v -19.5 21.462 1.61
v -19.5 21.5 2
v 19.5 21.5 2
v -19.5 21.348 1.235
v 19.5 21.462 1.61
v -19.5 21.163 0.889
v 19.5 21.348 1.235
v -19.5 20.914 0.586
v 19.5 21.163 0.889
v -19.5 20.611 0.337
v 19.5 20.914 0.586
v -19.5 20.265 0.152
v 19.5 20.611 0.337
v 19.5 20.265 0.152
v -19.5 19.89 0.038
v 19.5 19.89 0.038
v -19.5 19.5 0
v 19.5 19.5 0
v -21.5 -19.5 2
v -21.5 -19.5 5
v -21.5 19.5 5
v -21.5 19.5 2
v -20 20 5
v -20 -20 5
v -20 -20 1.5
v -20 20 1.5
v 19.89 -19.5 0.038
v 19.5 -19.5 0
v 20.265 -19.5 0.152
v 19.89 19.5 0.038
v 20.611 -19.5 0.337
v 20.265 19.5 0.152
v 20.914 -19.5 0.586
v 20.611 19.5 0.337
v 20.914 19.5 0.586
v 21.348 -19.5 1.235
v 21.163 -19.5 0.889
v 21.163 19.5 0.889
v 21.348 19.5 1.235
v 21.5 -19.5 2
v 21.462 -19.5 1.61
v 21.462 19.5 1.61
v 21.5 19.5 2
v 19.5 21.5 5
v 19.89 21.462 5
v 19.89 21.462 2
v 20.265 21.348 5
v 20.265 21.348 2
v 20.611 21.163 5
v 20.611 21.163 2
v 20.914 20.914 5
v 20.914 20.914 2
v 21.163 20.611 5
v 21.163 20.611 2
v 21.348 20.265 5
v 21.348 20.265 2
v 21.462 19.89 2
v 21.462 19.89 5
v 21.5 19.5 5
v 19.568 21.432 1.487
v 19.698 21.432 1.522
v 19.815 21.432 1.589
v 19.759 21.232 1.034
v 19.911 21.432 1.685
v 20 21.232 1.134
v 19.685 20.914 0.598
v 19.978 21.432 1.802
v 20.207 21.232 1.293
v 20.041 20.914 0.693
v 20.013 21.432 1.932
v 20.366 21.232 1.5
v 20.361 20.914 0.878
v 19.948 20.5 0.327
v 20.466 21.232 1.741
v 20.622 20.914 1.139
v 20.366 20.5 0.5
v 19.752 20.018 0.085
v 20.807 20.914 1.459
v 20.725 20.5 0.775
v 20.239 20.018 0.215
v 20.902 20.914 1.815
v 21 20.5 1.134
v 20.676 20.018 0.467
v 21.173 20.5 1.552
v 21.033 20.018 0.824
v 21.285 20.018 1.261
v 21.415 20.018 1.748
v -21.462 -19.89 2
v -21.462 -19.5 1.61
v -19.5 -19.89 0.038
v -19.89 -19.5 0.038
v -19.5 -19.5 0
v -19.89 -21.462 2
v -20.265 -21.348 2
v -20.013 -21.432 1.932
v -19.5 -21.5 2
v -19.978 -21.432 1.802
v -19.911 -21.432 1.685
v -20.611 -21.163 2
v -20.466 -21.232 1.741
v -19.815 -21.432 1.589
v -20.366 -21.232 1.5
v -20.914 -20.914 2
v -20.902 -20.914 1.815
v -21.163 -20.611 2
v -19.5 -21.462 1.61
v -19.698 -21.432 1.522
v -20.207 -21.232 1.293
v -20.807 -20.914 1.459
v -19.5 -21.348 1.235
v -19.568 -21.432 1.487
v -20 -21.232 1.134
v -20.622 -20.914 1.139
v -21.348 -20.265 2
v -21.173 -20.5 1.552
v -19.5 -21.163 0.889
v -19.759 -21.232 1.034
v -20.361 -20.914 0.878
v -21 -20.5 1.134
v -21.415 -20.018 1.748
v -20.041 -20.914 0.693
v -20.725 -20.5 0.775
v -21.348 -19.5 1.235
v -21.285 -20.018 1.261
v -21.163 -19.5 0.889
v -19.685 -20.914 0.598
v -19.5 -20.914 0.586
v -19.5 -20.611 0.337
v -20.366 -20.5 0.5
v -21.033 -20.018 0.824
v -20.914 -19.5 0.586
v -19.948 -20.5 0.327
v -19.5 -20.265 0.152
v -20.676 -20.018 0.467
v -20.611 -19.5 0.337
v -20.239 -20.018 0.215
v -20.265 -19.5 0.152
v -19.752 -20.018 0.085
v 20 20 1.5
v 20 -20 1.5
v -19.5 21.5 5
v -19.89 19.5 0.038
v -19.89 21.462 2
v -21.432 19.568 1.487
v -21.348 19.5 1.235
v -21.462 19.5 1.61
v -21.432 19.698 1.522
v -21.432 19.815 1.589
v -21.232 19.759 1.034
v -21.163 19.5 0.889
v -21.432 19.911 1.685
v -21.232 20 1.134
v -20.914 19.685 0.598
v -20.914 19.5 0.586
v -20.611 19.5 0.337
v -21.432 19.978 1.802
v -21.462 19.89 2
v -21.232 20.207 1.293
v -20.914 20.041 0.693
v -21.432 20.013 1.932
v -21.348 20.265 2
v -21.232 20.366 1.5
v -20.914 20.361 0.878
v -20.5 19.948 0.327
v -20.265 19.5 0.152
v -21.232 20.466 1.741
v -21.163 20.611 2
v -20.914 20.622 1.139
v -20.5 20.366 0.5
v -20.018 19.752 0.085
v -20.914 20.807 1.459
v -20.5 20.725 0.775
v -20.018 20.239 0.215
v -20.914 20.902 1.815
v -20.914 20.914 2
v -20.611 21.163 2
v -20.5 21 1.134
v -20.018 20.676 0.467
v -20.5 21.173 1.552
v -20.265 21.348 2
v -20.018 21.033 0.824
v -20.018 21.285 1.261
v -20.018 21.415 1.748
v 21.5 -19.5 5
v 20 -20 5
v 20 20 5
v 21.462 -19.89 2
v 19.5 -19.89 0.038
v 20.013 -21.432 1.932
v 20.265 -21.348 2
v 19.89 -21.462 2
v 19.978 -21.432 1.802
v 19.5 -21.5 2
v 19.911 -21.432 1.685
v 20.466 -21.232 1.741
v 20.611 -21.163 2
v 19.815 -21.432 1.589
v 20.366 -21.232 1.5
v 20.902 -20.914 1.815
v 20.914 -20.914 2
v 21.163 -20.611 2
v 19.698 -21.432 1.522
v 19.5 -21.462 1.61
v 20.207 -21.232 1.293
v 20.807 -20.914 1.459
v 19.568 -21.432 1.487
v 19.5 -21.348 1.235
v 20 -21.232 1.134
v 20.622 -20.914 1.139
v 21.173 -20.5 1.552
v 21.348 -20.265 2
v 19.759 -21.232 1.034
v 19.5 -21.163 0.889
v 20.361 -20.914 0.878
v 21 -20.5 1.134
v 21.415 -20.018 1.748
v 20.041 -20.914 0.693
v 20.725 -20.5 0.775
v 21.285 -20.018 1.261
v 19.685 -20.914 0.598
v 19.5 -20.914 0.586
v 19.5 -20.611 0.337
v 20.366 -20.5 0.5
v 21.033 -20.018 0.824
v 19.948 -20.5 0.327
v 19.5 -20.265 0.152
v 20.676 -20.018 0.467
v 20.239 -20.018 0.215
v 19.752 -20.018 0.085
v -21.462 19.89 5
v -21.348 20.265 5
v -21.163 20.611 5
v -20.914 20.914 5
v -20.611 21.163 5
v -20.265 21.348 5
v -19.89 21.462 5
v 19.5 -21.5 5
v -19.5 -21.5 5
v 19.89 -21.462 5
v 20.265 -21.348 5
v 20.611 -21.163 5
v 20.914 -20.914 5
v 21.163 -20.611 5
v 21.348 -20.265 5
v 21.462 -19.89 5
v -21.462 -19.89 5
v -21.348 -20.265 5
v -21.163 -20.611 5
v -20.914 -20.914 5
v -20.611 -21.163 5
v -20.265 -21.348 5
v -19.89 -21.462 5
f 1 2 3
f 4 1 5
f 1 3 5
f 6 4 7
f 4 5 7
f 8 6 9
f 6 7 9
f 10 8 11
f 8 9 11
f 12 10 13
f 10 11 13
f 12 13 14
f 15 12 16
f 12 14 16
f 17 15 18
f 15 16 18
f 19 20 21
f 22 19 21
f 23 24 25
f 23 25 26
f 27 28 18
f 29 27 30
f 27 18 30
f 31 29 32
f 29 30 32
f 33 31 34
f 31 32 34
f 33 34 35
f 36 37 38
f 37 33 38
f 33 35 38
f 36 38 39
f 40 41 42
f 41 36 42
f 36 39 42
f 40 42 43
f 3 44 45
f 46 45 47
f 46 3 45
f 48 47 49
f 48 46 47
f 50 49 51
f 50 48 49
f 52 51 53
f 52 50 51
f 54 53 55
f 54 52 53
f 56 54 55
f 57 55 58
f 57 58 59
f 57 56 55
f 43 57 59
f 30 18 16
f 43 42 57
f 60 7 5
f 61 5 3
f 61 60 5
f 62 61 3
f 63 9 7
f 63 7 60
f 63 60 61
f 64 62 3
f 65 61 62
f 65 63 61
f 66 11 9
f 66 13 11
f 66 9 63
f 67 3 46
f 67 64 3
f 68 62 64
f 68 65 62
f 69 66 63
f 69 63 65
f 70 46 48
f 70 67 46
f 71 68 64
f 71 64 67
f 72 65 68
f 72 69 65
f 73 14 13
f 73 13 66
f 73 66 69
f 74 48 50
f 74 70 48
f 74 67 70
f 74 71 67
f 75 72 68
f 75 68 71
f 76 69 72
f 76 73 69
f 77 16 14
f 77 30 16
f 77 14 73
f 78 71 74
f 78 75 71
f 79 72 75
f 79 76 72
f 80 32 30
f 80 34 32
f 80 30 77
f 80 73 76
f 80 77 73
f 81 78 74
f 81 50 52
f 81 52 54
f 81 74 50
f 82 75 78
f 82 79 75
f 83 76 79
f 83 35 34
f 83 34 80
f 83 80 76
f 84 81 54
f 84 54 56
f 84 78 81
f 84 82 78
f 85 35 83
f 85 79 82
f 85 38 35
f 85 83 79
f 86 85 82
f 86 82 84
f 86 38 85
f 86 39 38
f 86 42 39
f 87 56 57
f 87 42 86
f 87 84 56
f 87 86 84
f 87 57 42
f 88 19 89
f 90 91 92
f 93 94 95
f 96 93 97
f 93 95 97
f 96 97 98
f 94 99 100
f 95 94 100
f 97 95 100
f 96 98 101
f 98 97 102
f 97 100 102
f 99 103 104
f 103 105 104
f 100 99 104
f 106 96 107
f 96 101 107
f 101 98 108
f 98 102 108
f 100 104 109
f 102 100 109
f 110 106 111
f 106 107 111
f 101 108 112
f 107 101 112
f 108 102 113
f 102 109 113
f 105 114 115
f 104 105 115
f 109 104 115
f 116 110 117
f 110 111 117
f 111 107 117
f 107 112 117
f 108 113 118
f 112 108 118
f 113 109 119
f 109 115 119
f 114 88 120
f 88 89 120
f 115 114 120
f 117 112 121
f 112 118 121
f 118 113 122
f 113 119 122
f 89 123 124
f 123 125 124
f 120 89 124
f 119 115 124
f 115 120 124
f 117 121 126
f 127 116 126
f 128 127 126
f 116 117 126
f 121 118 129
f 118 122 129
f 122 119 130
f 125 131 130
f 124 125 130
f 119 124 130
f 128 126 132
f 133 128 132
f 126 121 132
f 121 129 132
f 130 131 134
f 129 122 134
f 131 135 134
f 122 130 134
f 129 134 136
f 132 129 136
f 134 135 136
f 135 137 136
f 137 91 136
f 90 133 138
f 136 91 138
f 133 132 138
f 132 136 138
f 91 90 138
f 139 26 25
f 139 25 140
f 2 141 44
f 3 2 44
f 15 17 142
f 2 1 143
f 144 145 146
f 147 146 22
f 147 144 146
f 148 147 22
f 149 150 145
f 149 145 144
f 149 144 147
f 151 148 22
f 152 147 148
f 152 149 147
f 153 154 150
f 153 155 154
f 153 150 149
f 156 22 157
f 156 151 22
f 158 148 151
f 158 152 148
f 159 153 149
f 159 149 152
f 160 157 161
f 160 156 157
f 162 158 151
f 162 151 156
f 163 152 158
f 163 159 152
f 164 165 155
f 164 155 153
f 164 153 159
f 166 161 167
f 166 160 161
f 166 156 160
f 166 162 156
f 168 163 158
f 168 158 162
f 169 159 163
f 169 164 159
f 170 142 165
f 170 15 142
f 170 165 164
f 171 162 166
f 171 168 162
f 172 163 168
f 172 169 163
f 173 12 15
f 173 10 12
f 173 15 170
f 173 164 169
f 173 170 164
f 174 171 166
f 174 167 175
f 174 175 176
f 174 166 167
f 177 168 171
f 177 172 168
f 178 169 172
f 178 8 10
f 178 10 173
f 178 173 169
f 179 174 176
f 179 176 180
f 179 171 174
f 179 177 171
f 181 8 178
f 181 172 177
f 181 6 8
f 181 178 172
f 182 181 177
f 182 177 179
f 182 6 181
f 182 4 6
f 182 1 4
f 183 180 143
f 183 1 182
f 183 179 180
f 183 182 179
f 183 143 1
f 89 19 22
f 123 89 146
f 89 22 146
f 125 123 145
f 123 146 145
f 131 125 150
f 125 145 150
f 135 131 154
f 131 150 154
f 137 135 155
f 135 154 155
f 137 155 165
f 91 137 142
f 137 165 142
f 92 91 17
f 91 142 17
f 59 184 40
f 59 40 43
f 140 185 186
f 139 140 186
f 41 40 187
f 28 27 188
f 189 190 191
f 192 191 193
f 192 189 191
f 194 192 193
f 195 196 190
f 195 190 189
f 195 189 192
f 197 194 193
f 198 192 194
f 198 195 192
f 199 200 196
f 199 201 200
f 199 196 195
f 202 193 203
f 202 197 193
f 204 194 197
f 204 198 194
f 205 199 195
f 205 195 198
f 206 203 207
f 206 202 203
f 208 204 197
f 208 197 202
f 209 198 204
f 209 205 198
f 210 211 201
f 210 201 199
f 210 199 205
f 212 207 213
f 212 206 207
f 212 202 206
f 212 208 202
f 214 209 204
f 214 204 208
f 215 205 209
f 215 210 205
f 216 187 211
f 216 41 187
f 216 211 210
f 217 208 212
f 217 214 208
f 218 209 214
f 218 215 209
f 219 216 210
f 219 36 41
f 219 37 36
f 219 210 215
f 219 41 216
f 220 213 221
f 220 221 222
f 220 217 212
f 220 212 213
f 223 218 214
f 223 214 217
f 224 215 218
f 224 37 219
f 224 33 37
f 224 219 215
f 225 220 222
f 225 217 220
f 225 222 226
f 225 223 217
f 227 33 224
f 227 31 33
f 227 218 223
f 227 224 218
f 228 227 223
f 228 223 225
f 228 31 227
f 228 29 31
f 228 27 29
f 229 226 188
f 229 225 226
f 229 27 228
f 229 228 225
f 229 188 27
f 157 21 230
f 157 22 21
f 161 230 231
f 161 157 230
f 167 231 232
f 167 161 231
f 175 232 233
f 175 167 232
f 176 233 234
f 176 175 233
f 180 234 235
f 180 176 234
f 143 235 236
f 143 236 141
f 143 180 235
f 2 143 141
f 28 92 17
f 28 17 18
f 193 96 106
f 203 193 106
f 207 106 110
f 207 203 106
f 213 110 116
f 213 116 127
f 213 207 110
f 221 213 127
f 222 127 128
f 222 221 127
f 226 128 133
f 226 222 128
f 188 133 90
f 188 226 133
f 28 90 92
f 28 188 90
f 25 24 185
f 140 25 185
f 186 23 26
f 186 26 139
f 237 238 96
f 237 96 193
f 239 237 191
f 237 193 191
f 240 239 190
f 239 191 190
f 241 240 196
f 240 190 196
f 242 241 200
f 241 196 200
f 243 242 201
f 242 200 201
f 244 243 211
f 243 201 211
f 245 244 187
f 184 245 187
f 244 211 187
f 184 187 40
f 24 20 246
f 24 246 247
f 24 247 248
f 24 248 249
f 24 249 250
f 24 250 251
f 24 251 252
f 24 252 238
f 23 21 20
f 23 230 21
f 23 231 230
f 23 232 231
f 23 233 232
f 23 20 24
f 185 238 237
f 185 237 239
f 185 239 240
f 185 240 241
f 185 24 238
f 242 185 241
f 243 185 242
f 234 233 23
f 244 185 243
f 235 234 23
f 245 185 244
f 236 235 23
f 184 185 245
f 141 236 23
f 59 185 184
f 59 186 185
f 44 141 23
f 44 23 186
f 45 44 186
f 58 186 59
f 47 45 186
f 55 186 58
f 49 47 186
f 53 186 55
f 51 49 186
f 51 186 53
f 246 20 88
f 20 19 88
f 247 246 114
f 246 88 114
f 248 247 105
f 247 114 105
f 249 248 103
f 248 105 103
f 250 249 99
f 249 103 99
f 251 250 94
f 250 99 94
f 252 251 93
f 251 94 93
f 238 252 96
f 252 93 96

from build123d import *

# Parameters (mm, degrees)
IZIM1_W                     = 43
IZIM1_H                     = 43
Y_KSEKLIK_EKSTR_ZYON1_DEPTH = 5
IZIM2_W                     = 40
IZIM2_H                     = 40
KES_EKSTR_ZYON1_DEPTH       = 3.5
RADYUS1_R                   = 2


with BuildPart() as part:
    # Çizim1 → Yükseklik-Ekstrüzyon1 (new body)
    with BuildSketch(Plane.XY.offset(5)):
        Rectangle(IZIM1_W, IZIM1_H)
    extrude(amount=-Y_KSEKLIK_EKSTR_ZYON1_DEPTH)

    # Çizim2 → Kes-Ekstrüzyon1 (cut)
    with BuildSketch(Plane.XY.offset(5)):
        Rectangle(IZIM2_W, IZIM2_H)
    extrude(amount=-KES_EKSTR_ZYON1_DEPTH, mode=Mode.SUBTRACT)

    # Radyus1
    radyus1_edges = [part.edges().sort_by_distance(p)[0] for p in [
        (21.5, 0, 0),
        (0, 21.5, 0),
        (-21.5, 0, 0),
        (-21.5, 21.5, 2.5),
        (21.5, 21.5, 2.5),
        (21.5, -21.5, 2.5),
        (-21.5, -21.5, 2.5),
        (0, -21.5, 0),
    ]]
    fillet(radyus1_edges, radius=RADYUS1_R)


solid = part.part
